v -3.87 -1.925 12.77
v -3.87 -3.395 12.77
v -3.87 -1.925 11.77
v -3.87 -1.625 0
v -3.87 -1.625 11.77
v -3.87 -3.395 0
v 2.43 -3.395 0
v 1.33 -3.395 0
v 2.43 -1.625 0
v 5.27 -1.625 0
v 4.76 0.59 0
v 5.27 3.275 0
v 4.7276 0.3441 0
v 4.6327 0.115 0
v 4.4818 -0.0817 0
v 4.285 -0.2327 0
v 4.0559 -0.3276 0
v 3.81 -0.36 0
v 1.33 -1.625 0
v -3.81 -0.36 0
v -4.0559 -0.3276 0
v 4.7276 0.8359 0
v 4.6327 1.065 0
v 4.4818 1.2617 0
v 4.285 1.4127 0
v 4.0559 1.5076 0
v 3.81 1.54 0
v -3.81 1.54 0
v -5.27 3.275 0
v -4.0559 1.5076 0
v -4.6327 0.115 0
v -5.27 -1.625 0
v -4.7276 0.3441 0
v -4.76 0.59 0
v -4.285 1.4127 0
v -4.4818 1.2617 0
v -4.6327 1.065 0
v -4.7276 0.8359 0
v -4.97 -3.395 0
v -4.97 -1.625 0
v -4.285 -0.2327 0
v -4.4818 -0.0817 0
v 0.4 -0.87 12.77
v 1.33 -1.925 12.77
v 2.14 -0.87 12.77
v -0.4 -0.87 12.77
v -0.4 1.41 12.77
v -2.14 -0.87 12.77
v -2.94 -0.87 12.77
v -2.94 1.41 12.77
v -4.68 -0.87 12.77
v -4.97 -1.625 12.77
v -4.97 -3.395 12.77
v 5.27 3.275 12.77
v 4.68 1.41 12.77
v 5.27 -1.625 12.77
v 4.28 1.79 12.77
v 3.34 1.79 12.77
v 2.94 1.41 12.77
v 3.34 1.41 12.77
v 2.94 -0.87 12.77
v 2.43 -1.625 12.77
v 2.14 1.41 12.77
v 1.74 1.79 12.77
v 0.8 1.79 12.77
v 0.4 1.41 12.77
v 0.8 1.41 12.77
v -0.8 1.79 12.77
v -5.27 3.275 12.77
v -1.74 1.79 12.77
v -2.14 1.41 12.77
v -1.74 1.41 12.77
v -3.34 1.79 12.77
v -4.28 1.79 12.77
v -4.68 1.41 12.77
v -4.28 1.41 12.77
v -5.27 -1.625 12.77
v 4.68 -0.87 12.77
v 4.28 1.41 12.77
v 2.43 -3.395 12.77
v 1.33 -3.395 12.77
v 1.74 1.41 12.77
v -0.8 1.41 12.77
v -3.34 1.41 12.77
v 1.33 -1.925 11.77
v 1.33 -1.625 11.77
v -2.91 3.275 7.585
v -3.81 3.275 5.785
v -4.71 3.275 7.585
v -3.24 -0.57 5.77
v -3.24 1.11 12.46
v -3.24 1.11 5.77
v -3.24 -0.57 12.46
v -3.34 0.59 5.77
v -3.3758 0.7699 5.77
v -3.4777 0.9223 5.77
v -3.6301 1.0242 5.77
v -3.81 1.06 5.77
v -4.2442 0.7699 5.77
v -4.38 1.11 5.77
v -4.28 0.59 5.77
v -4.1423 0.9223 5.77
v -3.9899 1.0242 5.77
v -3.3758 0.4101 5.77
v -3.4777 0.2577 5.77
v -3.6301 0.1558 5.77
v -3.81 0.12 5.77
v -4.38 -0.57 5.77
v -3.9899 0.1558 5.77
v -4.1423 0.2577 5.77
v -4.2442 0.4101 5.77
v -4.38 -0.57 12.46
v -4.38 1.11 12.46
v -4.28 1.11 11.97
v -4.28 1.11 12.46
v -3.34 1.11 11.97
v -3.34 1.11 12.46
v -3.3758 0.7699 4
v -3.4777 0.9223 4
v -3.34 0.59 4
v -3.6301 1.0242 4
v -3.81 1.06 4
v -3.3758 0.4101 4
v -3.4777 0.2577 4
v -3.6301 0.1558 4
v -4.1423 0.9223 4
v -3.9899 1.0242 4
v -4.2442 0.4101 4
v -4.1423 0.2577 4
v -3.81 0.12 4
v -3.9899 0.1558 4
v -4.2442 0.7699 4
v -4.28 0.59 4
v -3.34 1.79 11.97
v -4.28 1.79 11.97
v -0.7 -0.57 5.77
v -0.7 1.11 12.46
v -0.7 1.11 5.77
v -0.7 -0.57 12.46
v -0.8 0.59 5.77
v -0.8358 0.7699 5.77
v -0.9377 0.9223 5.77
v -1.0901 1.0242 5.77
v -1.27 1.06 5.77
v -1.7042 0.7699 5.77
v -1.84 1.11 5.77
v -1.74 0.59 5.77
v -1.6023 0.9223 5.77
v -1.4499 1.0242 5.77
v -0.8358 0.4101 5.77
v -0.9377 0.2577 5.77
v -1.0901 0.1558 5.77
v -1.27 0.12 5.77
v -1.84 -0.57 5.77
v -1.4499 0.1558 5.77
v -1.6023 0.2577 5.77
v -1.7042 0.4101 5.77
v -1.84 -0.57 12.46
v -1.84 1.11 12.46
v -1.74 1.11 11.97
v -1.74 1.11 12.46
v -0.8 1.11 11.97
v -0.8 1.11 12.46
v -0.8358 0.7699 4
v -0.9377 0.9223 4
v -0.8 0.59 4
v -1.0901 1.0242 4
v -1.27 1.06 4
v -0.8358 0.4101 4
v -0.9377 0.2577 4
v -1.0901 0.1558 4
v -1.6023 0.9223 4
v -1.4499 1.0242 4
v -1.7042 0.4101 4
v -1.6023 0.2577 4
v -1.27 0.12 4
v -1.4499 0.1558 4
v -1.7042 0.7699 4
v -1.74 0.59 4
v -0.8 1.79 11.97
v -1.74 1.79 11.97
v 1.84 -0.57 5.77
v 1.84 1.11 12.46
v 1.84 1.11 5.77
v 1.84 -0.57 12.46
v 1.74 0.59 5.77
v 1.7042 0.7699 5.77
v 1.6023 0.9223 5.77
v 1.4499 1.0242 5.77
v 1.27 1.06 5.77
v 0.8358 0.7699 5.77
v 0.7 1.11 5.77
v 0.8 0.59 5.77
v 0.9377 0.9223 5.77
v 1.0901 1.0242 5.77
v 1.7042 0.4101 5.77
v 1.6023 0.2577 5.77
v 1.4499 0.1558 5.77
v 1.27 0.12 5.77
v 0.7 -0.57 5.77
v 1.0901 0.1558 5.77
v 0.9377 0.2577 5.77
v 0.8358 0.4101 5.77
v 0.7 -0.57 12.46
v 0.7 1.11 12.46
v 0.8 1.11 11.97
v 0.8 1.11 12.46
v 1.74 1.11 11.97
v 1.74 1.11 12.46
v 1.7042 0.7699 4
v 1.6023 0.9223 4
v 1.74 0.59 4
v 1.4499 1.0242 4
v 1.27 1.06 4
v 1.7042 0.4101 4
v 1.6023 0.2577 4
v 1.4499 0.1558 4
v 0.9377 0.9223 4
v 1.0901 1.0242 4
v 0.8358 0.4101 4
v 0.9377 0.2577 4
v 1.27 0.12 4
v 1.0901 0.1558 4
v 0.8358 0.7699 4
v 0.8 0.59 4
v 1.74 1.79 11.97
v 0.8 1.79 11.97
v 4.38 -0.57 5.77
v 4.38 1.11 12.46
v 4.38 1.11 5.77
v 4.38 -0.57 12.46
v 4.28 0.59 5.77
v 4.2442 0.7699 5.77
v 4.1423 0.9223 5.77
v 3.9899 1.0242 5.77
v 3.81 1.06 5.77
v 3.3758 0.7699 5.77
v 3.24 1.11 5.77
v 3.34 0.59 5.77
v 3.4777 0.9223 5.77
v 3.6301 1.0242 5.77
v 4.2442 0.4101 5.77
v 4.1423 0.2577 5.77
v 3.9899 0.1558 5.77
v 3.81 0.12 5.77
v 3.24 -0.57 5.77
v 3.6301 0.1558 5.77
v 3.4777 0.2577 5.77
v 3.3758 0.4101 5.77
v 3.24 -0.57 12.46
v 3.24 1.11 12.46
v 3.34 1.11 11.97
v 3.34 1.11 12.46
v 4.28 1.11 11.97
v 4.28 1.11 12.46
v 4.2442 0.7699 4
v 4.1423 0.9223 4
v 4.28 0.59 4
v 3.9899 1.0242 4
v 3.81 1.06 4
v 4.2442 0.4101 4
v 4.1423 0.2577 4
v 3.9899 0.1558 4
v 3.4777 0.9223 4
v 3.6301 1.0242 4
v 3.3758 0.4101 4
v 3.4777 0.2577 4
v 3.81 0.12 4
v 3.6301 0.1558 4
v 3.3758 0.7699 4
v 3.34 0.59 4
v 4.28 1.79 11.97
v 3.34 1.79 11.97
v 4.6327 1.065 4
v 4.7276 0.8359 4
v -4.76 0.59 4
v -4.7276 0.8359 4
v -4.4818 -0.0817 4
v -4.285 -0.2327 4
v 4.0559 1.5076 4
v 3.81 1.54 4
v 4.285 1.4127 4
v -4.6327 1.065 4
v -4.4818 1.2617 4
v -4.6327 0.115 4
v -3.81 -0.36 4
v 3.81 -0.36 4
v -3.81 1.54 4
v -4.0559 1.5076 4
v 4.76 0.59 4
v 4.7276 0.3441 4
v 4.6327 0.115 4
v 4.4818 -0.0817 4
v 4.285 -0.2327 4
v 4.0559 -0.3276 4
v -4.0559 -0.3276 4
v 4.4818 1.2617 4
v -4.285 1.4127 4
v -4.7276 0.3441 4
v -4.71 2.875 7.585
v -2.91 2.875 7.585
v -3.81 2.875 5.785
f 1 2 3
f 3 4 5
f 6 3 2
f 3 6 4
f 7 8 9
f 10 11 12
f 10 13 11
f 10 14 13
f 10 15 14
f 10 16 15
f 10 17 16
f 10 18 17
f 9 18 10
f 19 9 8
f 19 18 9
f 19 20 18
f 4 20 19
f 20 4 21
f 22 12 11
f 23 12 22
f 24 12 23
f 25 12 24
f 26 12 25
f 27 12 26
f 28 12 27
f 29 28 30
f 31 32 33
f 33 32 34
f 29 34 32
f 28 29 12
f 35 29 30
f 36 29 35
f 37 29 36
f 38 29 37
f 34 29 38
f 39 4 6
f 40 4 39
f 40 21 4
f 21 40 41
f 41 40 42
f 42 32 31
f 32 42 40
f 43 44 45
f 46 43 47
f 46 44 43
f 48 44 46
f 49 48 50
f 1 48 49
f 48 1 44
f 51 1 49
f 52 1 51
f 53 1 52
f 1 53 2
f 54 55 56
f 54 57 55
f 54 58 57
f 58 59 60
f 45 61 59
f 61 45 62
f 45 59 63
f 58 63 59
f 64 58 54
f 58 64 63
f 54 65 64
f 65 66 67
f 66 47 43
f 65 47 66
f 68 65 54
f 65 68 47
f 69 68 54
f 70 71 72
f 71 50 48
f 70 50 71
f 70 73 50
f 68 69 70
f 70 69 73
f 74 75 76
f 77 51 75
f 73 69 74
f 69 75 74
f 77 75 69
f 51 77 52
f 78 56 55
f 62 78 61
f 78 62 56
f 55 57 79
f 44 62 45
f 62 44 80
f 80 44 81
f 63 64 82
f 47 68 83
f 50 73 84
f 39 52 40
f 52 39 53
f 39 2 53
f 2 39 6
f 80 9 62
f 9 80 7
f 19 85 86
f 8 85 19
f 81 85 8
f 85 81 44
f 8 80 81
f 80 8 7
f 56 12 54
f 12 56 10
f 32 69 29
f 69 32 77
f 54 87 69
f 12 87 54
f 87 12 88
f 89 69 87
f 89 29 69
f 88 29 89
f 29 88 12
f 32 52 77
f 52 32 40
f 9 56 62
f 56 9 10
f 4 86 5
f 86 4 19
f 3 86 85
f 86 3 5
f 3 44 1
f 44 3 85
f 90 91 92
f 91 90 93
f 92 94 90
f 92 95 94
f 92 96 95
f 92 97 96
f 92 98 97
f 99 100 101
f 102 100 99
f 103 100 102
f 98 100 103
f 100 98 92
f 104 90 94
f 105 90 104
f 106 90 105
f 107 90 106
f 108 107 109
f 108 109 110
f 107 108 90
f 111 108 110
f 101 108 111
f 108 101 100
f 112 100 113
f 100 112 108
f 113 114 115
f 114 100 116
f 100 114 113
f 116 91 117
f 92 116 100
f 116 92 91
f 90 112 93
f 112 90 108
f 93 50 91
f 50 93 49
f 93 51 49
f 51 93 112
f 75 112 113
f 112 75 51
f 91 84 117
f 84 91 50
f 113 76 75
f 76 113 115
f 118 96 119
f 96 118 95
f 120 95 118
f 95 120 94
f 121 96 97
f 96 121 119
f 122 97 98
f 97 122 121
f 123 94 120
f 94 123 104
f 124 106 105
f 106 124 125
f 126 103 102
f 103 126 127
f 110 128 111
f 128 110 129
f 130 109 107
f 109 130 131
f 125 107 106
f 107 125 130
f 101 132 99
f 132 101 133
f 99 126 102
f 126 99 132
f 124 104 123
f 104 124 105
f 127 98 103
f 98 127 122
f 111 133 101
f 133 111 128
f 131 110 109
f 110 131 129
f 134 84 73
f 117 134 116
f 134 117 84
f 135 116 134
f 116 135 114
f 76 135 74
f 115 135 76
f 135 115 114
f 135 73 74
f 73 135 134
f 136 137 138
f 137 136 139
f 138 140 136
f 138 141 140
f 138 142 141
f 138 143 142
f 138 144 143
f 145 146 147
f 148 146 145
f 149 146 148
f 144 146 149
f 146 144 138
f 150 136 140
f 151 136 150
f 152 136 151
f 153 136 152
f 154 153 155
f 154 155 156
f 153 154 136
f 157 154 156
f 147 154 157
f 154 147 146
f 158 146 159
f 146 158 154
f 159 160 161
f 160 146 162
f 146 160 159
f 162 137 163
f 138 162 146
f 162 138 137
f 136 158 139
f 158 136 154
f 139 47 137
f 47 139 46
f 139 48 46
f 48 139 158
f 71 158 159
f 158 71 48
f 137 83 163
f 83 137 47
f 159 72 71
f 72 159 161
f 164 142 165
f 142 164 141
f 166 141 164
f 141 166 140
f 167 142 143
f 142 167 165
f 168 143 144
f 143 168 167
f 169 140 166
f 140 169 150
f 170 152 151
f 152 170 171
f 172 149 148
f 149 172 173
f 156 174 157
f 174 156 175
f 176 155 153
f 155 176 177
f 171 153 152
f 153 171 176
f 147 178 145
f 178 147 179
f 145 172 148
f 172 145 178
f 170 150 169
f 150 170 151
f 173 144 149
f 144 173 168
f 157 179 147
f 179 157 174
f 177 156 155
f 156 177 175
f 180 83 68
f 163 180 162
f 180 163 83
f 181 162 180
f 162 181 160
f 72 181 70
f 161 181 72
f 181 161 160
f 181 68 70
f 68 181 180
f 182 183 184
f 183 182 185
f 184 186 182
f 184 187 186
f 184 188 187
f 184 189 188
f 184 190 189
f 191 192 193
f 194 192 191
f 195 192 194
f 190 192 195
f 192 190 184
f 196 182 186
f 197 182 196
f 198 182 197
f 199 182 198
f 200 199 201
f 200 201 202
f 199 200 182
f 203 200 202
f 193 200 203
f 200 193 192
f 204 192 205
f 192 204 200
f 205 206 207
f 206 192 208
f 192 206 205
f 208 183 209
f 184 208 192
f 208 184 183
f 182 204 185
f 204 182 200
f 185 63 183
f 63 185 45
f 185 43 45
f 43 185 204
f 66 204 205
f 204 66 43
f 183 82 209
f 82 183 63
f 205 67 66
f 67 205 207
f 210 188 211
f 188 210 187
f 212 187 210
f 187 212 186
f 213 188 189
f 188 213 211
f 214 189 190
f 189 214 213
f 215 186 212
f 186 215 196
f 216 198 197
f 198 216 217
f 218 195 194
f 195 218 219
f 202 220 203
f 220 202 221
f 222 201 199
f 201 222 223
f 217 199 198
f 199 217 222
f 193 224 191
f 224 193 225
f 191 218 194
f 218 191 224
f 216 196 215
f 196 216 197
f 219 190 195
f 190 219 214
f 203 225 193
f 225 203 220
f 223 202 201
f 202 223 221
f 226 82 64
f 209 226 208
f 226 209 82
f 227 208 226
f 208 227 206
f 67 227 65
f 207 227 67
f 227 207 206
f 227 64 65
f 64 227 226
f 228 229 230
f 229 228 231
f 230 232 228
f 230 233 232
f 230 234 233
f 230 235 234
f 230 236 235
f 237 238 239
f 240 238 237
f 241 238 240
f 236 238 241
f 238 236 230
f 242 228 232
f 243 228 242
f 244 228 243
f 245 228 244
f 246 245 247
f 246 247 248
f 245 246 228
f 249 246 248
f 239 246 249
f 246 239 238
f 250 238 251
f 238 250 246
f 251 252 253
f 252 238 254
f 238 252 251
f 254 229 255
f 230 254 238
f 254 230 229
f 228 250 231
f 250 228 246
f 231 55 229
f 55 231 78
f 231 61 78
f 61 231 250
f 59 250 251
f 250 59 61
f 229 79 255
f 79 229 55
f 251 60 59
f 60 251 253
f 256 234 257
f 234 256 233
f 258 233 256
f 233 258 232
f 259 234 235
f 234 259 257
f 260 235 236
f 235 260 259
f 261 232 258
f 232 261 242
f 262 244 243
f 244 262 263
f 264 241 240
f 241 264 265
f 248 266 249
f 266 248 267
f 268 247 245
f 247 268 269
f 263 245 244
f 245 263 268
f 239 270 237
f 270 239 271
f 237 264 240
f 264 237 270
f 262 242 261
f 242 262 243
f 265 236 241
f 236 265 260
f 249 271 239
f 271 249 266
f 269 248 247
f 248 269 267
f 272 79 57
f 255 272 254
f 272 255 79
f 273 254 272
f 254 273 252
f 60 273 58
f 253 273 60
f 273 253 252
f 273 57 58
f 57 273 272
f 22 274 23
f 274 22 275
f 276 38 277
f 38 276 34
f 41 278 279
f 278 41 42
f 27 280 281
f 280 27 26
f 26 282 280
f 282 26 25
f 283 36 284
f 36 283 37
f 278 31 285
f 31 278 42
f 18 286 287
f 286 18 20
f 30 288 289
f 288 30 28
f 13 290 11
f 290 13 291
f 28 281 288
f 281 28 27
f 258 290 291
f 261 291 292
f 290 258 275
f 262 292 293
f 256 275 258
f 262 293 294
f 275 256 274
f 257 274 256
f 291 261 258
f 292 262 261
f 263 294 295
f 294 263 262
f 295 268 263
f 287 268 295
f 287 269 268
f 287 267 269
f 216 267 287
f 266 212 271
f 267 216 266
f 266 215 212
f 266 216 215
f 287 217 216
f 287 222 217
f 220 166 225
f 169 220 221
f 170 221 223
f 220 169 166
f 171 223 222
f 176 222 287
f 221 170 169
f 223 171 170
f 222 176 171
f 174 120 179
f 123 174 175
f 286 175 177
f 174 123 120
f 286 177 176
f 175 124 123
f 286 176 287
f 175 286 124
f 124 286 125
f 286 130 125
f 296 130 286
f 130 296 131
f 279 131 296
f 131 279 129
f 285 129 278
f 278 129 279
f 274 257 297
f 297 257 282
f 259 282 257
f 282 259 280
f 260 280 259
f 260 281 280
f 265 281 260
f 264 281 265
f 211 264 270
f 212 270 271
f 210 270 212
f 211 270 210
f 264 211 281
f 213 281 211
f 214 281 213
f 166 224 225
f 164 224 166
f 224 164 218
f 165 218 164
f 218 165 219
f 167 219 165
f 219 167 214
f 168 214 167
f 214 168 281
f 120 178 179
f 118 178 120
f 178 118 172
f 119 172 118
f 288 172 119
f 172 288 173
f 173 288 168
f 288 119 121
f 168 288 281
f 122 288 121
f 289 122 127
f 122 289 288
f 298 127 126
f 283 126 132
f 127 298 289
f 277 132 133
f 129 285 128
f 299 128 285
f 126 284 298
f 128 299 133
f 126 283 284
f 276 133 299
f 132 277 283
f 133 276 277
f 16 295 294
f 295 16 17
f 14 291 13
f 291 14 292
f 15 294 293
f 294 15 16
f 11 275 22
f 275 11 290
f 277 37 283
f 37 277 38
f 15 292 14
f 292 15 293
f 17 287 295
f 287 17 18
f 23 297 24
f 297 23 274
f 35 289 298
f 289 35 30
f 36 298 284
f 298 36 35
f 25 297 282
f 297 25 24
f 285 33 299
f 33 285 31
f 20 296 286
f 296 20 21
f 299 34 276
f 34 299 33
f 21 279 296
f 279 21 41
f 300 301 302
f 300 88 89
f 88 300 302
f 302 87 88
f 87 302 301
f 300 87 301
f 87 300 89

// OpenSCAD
// SPDX-FileCopyrightText: 2026 Alon A. Rabinowitz
// SPDX-License-Identifier: CC-BY-4.0

// The female, 4 pins, as it prints. Everything is in fan-connector.scad; this file only picks the part.
include <fan-connector.scad>
part = "female";
pins = 4;
